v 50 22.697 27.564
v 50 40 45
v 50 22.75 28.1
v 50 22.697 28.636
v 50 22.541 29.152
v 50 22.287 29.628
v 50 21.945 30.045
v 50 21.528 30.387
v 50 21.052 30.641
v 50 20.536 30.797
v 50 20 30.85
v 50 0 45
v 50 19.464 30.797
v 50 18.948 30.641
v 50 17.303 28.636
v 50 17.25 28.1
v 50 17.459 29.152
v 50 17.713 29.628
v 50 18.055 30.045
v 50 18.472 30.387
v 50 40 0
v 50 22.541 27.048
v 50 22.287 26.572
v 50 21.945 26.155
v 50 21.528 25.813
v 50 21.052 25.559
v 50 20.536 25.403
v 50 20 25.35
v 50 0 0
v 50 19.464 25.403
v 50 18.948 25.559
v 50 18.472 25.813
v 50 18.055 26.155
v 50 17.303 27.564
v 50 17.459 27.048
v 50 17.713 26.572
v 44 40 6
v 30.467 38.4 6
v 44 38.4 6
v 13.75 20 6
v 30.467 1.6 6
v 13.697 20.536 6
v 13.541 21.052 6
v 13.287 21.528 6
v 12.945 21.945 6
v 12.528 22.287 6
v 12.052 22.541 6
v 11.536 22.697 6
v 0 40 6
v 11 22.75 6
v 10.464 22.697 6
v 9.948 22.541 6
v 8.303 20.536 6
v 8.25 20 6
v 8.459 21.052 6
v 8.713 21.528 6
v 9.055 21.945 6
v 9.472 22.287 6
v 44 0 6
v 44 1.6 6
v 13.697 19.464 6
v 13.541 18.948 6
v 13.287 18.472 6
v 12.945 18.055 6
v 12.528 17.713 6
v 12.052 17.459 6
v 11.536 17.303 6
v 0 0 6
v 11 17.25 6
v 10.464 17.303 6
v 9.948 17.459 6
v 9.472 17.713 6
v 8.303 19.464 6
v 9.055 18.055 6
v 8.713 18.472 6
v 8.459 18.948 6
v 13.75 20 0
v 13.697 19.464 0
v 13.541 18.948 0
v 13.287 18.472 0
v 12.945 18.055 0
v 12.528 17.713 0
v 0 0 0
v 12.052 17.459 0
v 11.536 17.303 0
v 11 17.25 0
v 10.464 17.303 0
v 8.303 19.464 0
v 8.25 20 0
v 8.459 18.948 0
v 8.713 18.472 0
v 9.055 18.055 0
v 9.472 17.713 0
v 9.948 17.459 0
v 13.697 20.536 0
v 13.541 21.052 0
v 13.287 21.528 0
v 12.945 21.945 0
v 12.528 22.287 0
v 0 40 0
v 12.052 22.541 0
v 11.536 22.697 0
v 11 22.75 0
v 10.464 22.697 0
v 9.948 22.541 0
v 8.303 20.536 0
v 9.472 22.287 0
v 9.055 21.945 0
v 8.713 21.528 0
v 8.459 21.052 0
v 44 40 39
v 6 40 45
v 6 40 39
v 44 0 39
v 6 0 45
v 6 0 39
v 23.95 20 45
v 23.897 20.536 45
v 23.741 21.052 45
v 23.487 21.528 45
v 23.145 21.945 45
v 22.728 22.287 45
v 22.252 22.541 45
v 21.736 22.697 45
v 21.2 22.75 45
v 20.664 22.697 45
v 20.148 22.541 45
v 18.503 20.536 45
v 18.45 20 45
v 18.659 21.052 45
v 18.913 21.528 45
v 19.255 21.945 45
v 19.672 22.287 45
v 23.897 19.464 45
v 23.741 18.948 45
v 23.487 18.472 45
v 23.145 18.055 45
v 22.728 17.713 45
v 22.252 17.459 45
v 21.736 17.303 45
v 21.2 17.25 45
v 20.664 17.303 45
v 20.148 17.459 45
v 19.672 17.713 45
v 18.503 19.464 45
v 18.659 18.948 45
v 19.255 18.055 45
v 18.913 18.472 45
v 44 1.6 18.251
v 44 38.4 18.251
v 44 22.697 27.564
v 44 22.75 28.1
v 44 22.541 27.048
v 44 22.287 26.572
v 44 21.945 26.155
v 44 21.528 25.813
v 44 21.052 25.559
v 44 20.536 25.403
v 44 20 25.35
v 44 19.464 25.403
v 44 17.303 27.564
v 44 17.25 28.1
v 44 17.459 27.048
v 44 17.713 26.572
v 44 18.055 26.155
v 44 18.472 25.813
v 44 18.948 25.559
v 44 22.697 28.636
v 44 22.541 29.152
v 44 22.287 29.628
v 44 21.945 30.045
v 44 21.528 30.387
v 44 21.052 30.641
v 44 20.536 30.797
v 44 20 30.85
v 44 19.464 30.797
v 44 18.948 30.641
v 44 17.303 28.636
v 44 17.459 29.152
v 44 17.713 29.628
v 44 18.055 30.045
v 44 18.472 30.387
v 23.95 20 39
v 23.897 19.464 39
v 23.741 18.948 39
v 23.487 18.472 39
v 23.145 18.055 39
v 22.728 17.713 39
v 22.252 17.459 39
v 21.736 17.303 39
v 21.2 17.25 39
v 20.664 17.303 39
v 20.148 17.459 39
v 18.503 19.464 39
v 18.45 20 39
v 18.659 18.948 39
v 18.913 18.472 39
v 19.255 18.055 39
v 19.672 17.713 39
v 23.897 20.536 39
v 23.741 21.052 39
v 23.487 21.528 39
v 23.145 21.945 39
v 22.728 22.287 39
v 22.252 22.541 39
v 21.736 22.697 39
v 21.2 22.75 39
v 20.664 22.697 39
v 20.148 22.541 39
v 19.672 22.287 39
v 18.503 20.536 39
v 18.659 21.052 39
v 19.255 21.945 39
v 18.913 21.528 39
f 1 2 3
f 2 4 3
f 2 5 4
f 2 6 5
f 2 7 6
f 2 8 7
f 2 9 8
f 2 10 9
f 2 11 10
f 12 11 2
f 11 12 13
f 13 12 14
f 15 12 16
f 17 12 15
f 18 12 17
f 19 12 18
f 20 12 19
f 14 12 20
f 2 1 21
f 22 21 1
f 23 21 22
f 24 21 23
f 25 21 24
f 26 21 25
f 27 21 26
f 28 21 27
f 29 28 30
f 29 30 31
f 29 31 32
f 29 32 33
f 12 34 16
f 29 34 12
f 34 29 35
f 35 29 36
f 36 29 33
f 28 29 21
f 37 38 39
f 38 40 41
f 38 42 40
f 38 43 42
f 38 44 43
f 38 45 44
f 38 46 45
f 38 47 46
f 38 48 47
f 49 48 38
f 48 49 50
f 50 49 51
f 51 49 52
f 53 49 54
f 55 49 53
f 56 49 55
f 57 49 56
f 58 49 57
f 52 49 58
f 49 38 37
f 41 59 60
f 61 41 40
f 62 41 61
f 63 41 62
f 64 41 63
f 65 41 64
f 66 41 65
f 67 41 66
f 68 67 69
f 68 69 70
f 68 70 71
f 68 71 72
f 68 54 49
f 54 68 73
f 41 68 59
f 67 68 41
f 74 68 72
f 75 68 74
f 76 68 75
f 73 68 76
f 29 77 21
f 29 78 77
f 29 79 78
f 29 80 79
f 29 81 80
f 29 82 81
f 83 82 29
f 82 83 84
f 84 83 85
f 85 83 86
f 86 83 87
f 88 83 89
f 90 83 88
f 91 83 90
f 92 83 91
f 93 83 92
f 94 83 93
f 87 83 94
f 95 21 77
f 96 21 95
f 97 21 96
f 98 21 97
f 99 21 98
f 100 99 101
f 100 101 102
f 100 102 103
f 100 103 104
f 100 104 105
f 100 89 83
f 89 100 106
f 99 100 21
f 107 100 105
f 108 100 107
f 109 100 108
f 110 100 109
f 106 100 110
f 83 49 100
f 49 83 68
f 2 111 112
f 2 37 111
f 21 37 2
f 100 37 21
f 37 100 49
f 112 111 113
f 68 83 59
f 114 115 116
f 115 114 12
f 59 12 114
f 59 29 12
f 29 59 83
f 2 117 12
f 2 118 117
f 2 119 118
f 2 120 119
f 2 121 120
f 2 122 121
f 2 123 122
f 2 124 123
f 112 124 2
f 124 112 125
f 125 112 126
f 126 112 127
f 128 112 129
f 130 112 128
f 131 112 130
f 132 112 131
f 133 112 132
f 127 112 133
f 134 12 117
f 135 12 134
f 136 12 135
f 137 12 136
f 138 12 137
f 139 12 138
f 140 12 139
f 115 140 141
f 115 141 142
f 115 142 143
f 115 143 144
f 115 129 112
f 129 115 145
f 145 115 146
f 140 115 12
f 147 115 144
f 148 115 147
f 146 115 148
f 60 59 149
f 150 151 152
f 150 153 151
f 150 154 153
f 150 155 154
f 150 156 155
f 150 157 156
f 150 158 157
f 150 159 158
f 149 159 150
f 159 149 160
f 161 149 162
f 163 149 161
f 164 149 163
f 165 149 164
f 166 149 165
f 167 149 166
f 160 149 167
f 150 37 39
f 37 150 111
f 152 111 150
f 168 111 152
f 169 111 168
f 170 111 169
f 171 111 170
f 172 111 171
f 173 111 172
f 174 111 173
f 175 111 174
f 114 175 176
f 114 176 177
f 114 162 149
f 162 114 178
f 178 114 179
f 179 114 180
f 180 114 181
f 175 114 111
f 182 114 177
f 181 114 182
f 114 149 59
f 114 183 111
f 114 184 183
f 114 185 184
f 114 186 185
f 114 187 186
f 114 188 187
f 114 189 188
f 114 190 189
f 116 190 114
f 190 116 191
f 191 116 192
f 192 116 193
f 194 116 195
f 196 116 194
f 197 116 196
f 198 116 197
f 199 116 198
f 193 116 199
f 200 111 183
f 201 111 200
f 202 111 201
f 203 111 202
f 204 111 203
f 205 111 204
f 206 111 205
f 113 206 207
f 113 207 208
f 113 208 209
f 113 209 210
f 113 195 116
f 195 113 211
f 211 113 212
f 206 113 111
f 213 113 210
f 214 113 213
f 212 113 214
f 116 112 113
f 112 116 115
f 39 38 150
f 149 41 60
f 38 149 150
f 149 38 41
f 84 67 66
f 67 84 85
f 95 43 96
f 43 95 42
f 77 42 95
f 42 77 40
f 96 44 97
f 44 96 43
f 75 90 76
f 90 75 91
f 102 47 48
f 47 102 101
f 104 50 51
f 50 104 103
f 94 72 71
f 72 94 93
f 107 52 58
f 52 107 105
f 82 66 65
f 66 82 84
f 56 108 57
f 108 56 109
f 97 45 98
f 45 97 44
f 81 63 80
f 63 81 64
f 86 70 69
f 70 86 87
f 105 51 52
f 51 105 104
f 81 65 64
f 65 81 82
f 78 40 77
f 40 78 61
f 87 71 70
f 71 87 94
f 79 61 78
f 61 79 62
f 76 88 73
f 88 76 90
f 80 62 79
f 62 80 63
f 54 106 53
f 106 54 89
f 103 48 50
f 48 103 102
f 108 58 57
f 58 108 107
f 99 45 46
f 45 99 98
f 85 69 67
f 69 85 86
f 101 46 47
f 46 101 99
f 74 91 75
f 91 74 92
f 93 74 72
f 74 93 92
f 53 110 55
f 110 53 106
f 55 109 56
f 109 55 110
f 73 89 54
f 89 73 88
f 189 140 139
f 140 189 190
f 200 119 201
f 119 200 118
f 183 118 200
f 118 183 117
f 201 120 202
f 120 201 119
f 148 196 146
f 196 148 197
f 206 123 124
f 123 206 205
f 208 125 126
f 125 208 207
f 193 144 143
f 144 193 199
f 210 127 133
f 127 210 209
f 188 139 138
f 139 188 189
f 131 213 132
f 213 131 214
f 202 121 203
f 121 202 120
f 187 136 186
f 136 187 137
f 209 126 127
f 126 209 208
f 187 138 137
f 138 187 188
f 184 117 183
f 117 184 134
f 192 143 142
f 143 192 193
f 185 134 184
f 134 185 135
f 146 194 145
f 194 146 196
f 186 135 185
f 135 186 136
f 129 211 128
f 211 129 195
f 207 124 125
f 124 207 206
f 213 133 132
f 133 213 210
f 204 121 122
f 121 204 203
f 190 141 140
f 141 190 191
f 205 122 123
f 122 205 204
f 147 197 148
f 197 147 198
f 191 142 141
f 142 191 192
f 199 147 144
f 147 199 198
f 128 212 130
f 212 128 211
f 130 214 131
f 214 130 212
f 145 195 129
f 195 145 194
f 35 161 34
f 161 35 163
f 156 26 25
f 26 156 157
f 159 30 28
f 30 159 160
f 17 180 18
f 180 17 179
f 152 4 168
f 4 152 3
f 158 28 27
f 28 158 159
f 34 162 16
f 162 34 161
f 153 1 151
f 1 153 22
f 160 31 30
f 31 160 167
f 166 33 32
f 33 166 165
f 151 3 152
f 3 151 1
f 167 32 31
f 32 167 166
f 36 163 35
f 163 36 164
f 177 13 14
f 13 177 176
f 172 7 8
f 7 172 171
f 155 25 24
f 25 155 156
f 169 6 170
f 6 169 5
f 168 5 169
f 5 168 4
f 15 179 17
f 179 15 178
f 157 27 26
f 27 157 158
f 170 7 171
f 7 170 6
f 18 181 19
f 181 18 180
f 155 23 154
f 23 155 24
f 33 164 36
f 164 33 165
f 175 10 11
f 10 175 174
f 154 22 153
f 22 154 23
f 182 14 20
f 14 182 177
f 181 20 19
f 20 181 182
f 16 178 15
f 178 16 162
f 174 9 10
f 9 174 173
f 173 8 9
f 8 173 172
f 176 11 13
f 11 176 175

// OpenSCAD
$fn = 32;

// ----------------------------------------------------------------------
// Z-bracket: 50 x 40 x 45 mm
// ----------------------------------------------------------------------

// --- parameters (mm) ---
lower_leg = 50;           // lower foot length, X
upper_leg = 38;           // upper foot length, X
bracket_w = 40;           // bracket width, Y
offset_h = 45;            // overall rise, Z
sheet_t = 6;              // plate thickness
hole_d = 5.5;             // clearance for M5
rib_len = 15.3;           // gusset leg
rib_sink = 1.6;           // gusset overlap into the plates

module hole_z(px, py, z0) {
  translate([px, py, z0 - 2.5]) cylinder(h = sheet_t + 5, d = hole_d);
}
module hole_x(py, pz) {
  translate([-2.5, py, pz]) rotate([0, 90, 0]) cylinder(h = sheet_t + 5, d = hole_d);
}
module gusset(x0) {
  translate([x0, bracket_w - rib_sink, 0])
    rotate([90, 0, 0])
      linear_extrude(height = bracket_w - 2 * rib_sink)
        polygon(points = [[rib_sink, sheet_t - rib_sink],
                          [rib_sink, sheet_t - rib_sink + rib_len],
                          [-rib_len, sheet_t - rib_sink]]);
}

difference() {
  union() {
    cube([lower_leg, bracket_w, sheet_t]);
    /* web, overlapping the lower foot */
    translate([lower_leg - sheet_t, 0, 0]) cube([sheet_t, bracket_w, offset_h]);
    /* upper foot, sunk into the web */
    translate([lower_leg - sheet_t - upper_leg, 0, offset_h - sheet_t]) cube([upper_leg + sheet_t, bracket_w, sheet_t]);
    gusset(lower_leg - sheet_t);
  }
  hole_z(11, 20, 0);
  translate([lower_leg - sheet_t - 22.8, 0, 0]) hole_z(0, 20, offset_h - sheet_t);
  translate([lower_leg - sheet_t, 0, 0]) hole_x(20, 28.1);
}
